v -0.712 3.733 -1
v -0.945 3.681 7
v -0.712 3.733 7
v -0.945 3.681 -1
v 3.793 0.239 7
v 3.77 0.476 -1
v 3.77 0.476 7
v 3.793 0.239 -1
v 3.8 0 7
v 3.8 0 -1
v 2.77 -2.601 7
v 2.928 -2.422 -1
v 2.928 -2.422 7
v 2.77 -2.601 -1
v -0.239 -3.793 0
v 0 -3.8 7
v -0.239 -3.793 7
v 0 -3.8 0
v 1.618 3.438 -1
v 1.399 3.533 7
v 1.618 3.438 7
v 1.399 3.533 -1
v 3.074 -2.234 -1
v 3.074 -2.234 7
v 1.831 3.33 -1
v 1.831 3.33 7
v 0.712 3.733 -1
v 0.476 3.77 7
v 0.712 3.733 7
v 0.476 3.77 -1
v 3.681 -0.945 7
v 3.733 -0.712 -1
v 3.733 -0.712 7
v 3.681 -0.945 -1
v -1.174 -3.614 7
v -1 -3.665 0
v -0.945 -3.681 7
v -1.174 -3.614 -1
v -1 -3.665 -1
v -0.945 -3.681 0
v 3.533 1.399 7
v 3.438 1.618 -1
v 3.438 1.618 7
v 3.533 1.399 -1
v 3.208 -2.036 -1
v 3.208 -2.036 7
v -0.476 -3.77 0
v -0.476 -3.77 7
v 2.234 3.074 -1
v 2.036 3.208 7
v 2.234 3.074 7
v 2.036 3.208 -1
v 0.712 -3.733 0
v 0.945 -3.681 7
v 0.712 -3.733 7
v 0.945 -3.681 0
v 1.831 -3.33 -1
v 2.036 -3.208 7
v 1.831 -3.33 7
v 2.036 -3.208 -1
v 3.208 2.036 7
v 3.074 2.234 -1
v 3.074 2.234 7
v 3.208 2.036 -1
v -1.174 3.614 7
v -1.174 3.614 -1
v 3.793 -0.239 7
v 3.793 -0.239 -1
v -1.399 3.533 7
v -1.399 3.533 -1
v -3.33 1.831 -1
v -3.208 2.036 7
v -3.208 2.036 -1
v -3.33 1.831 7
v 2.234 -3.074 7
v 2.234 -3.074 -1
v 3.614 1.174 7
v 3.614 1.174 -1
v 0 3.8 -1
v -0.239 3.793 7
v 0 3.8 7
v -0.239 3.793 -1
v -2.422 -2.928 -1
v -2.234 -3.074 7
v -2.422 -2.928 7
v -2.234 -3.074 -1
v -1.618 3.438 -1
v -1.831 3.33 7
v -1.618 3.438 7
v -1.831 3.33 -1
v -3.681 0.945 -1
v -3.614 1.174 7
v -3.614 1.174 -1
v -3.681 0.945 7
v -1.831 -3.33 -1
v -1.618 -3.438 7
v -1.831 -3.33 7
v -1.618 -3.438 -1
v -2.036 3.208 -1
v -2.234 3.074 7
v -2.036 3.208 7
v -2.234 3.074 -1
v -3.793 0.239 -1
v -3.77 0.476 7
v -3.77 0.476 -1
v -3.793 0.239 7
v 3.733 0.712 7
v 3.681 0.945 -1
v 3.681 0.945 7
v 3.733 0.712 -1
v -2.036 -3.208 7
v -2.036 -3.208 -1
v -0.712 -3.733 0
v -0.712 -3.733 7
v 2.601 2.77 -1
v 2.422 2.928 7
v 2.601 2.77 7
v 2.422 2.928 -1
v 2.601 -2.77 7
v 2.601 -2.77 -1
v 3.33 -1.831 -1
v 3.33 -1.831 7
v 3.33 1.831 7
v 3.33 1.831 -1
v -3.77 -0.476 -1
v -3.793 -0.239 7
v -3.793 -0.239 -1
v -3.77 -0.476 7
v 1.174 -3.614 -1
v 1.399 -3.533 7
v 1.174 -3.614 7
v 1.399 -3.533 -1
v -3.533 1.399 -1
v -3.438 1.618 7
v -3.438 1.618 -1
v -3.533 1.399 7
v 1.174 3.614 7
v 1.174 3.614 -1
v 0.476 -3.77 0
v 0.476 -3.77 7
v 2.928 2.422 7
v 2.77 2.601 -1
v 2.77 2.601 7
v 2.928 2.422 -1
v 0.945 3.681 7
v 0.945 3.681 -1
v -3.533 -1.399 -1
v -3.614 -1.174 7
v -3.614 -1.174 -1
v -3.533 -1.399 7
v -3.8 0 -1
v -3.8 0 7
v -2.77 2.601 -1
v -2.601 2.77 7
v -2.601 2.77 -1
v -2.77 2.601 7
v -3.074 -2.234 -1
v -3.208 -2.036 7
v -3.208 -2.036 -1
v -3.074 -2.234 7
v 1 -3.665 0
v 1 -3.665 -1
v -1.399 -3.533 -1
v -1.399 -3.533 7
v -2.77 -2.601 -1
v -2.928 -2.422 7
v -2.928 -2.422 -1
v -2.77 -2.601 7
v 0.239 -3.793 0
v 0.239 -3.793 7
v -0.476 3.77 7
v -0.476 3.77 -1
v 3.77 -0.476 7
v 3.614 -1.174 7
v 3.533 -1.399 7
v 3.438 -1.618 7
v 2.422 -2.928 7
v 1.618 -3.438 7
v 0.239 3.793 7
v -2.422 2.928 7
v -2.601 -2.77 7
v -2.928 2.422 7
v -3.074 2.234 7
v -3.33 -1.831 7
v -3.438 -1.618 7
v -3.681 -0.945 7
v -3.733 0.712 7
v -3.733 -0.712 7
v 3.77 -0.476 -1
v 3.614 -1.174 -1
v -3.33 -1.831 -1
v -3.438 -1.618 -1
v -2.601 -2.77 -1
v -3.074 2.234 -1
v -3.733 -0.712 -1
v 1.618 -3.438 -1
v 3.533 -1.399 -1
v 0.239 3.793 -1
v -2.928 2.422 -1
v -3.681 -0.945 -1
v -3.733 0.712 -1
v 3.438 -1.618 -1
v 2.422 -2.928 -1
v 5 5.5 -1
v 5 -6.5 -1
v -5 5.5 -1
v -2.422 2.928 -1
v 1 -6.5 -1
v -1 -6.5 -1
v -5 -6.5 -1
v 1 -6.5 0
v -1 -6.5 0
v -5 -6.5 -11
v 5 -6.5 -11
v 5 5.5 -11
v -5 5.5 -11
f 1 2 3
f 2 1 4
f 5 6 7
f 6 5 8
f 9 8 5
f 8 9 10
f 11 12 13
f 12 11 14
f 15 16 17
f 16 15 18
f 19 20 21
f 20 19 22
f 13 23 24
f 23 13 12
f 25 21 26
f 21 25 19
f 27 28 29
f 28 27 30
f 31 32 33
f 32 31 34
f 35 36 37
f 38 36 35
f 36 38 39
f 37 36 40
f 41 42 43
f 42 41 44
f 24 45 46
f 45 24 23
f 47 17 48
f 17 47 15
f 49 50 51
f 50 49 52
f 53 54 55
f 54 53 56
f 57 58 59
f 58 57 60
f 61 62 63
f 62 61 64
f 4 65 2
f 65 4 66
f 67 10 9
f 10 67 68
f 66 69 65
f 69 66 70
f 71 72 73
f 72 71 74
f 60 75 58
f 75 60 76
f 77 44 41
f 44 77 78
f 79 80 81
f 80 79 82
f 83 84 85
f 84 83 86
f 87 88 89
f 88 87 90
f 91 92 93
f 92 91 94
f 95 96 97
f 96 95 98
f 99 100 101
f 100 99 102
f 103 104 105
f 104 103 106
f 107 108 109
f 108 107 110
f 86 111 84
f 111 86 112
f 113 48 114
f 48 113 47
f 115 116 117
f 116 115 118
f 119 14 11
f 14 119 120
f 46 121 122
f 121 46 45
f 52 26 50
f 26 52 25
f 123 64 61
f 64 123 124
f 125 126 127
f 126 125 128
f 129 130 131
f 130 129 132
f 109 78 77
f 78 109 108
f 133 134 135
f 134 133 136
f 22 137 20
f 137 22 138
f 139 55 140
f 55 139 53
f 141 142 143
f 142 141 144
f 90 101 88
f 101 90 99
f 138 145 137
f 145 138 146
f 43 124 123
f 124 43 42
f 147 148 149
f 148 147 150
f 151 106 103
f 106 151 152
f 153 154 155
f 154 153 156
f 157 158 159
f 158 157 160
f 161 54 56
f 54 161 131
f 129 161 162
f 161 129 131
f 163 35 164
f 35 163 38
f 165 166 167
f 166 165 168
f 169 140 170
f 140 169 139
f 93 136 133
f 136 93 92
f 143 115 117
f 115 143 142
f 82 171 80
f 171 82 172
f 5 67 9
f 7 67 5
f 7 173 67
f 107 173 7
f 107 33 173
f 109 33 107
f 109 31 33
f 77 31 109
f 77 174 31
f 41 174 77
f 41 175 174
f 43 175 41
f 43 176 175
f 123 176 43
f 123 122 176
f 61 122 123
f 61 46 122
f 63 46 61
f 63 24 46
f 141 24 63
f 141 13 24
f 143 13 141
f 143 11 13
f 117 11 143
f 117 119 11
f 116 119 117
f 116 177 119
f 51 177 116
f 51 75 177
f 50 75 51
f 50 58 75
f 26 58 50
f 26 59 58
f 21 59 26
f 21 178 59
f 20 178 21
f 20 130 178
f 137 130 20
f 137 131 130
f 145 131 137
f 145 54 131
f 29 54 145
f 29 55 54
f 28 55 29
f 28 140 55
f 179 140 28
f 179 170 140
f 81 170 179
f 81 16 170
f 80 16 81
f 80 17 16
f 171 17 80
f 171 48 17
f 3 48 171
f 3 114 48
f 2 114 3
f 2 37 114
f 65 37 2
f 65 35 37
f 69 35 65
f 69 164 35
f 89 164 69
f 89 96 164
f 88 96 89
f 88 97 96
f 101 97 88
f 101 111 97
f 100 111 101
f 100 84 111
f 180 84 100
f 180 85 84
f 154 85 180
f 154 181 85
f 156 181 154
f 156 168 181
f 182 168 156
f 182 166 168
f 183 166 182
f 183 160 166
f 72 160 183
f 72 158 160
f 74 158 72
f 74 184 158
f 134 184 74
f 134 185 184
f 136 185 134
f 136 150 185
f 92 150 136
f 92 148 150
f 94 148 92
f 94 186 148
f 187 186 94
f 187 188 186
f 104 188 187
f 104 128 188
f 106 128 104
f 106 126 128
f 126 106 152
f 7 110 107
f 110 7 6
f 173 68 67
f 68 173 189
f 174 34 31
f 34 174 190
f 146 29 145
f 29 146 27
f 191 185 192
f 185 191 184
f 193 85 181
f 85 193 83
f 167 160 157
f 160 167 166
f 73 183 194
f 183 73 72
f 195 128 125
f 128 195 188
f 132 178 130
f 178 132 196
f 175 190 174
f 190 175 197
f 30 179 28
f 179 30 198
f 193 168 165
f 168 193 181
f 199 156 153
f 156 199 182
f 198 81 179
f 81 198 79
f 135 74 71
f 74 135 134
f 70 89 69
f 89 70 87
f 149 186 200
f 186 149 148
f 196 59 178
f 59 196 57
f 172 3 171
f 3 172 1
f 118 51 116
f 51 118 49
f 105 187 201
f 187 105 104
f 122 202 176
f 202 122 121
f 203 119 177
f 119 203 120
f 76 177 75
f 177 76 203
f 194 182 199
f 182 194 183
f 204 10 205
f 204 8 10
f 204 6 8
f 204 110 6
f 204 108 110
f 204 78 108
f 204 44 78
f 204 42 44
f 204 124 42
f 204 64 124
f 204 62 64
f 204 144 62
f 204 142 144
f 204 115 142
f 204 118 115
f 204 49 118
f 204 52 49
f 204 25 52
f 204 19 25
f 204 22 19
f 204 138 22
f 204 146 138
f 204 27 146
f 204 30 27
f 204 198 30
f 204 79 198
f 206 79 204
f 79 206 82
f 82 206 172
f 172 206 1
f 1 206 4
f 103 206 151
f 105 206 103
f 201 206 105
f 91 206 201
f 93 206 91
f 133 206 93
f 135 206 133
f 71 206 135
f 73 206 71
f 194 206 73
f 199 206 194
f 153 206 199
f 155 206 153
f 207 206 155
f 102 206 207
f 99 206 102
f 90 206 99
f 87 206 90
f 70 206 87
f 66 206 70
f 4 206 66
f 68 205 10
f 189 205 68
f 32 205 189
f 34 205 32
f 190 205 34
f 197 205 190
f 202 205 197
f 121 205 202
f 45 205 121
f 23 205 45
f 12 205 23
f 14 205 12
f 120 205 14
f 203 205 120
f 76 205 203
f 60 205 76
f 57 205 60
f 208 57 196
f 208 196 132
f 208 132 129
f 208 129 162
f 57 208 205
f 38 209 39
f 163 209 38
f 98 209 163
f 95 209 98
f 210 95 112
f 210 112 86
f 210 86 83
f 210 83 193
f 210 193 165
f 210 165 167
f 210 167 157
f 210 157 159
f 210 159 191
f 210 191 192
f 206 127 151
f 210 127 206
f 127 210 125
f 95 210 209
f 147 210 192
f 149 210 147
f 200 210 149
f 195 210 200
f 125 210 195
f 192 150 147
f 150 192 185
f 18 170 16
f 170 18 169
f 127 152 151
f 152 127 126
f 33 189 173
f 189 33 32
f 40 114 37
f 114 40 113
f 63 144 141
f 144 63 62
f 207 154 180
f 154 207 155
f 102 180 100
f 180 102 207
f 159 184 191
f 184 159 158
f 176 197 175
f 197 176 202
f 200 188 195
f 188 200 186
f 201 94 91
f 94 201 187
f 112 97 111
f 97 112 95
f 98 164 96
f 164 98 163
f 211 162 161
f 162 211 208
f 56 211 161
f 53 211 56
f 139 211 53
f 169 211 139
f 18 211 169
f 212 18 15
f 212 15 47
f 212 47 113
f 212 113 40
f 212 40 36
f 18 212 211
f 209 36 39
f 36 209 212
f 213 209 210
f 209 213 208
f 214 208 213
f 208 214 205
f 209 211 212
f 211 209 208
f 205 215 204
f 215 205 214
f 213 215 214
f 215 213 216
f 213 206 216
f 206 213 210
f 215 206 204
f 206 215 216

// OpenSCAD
// Based on Alpha RD901F

tolerance = 0.3;
$fn = $preview ? 20 : 100;

module pot_rd901f() {
    translate([0, 0, -1])
    cylinder(r = 3.5 + tolerance, h = 8);

    translate([-1, -6.5, -1])
    cube([2, 3, 1]);
    
    translate([0, 0, -11])
        union() {
            translate([-5, -6.5, 0])
            cube([10, 12, 10]);
        }
}

pot_rd901f();
